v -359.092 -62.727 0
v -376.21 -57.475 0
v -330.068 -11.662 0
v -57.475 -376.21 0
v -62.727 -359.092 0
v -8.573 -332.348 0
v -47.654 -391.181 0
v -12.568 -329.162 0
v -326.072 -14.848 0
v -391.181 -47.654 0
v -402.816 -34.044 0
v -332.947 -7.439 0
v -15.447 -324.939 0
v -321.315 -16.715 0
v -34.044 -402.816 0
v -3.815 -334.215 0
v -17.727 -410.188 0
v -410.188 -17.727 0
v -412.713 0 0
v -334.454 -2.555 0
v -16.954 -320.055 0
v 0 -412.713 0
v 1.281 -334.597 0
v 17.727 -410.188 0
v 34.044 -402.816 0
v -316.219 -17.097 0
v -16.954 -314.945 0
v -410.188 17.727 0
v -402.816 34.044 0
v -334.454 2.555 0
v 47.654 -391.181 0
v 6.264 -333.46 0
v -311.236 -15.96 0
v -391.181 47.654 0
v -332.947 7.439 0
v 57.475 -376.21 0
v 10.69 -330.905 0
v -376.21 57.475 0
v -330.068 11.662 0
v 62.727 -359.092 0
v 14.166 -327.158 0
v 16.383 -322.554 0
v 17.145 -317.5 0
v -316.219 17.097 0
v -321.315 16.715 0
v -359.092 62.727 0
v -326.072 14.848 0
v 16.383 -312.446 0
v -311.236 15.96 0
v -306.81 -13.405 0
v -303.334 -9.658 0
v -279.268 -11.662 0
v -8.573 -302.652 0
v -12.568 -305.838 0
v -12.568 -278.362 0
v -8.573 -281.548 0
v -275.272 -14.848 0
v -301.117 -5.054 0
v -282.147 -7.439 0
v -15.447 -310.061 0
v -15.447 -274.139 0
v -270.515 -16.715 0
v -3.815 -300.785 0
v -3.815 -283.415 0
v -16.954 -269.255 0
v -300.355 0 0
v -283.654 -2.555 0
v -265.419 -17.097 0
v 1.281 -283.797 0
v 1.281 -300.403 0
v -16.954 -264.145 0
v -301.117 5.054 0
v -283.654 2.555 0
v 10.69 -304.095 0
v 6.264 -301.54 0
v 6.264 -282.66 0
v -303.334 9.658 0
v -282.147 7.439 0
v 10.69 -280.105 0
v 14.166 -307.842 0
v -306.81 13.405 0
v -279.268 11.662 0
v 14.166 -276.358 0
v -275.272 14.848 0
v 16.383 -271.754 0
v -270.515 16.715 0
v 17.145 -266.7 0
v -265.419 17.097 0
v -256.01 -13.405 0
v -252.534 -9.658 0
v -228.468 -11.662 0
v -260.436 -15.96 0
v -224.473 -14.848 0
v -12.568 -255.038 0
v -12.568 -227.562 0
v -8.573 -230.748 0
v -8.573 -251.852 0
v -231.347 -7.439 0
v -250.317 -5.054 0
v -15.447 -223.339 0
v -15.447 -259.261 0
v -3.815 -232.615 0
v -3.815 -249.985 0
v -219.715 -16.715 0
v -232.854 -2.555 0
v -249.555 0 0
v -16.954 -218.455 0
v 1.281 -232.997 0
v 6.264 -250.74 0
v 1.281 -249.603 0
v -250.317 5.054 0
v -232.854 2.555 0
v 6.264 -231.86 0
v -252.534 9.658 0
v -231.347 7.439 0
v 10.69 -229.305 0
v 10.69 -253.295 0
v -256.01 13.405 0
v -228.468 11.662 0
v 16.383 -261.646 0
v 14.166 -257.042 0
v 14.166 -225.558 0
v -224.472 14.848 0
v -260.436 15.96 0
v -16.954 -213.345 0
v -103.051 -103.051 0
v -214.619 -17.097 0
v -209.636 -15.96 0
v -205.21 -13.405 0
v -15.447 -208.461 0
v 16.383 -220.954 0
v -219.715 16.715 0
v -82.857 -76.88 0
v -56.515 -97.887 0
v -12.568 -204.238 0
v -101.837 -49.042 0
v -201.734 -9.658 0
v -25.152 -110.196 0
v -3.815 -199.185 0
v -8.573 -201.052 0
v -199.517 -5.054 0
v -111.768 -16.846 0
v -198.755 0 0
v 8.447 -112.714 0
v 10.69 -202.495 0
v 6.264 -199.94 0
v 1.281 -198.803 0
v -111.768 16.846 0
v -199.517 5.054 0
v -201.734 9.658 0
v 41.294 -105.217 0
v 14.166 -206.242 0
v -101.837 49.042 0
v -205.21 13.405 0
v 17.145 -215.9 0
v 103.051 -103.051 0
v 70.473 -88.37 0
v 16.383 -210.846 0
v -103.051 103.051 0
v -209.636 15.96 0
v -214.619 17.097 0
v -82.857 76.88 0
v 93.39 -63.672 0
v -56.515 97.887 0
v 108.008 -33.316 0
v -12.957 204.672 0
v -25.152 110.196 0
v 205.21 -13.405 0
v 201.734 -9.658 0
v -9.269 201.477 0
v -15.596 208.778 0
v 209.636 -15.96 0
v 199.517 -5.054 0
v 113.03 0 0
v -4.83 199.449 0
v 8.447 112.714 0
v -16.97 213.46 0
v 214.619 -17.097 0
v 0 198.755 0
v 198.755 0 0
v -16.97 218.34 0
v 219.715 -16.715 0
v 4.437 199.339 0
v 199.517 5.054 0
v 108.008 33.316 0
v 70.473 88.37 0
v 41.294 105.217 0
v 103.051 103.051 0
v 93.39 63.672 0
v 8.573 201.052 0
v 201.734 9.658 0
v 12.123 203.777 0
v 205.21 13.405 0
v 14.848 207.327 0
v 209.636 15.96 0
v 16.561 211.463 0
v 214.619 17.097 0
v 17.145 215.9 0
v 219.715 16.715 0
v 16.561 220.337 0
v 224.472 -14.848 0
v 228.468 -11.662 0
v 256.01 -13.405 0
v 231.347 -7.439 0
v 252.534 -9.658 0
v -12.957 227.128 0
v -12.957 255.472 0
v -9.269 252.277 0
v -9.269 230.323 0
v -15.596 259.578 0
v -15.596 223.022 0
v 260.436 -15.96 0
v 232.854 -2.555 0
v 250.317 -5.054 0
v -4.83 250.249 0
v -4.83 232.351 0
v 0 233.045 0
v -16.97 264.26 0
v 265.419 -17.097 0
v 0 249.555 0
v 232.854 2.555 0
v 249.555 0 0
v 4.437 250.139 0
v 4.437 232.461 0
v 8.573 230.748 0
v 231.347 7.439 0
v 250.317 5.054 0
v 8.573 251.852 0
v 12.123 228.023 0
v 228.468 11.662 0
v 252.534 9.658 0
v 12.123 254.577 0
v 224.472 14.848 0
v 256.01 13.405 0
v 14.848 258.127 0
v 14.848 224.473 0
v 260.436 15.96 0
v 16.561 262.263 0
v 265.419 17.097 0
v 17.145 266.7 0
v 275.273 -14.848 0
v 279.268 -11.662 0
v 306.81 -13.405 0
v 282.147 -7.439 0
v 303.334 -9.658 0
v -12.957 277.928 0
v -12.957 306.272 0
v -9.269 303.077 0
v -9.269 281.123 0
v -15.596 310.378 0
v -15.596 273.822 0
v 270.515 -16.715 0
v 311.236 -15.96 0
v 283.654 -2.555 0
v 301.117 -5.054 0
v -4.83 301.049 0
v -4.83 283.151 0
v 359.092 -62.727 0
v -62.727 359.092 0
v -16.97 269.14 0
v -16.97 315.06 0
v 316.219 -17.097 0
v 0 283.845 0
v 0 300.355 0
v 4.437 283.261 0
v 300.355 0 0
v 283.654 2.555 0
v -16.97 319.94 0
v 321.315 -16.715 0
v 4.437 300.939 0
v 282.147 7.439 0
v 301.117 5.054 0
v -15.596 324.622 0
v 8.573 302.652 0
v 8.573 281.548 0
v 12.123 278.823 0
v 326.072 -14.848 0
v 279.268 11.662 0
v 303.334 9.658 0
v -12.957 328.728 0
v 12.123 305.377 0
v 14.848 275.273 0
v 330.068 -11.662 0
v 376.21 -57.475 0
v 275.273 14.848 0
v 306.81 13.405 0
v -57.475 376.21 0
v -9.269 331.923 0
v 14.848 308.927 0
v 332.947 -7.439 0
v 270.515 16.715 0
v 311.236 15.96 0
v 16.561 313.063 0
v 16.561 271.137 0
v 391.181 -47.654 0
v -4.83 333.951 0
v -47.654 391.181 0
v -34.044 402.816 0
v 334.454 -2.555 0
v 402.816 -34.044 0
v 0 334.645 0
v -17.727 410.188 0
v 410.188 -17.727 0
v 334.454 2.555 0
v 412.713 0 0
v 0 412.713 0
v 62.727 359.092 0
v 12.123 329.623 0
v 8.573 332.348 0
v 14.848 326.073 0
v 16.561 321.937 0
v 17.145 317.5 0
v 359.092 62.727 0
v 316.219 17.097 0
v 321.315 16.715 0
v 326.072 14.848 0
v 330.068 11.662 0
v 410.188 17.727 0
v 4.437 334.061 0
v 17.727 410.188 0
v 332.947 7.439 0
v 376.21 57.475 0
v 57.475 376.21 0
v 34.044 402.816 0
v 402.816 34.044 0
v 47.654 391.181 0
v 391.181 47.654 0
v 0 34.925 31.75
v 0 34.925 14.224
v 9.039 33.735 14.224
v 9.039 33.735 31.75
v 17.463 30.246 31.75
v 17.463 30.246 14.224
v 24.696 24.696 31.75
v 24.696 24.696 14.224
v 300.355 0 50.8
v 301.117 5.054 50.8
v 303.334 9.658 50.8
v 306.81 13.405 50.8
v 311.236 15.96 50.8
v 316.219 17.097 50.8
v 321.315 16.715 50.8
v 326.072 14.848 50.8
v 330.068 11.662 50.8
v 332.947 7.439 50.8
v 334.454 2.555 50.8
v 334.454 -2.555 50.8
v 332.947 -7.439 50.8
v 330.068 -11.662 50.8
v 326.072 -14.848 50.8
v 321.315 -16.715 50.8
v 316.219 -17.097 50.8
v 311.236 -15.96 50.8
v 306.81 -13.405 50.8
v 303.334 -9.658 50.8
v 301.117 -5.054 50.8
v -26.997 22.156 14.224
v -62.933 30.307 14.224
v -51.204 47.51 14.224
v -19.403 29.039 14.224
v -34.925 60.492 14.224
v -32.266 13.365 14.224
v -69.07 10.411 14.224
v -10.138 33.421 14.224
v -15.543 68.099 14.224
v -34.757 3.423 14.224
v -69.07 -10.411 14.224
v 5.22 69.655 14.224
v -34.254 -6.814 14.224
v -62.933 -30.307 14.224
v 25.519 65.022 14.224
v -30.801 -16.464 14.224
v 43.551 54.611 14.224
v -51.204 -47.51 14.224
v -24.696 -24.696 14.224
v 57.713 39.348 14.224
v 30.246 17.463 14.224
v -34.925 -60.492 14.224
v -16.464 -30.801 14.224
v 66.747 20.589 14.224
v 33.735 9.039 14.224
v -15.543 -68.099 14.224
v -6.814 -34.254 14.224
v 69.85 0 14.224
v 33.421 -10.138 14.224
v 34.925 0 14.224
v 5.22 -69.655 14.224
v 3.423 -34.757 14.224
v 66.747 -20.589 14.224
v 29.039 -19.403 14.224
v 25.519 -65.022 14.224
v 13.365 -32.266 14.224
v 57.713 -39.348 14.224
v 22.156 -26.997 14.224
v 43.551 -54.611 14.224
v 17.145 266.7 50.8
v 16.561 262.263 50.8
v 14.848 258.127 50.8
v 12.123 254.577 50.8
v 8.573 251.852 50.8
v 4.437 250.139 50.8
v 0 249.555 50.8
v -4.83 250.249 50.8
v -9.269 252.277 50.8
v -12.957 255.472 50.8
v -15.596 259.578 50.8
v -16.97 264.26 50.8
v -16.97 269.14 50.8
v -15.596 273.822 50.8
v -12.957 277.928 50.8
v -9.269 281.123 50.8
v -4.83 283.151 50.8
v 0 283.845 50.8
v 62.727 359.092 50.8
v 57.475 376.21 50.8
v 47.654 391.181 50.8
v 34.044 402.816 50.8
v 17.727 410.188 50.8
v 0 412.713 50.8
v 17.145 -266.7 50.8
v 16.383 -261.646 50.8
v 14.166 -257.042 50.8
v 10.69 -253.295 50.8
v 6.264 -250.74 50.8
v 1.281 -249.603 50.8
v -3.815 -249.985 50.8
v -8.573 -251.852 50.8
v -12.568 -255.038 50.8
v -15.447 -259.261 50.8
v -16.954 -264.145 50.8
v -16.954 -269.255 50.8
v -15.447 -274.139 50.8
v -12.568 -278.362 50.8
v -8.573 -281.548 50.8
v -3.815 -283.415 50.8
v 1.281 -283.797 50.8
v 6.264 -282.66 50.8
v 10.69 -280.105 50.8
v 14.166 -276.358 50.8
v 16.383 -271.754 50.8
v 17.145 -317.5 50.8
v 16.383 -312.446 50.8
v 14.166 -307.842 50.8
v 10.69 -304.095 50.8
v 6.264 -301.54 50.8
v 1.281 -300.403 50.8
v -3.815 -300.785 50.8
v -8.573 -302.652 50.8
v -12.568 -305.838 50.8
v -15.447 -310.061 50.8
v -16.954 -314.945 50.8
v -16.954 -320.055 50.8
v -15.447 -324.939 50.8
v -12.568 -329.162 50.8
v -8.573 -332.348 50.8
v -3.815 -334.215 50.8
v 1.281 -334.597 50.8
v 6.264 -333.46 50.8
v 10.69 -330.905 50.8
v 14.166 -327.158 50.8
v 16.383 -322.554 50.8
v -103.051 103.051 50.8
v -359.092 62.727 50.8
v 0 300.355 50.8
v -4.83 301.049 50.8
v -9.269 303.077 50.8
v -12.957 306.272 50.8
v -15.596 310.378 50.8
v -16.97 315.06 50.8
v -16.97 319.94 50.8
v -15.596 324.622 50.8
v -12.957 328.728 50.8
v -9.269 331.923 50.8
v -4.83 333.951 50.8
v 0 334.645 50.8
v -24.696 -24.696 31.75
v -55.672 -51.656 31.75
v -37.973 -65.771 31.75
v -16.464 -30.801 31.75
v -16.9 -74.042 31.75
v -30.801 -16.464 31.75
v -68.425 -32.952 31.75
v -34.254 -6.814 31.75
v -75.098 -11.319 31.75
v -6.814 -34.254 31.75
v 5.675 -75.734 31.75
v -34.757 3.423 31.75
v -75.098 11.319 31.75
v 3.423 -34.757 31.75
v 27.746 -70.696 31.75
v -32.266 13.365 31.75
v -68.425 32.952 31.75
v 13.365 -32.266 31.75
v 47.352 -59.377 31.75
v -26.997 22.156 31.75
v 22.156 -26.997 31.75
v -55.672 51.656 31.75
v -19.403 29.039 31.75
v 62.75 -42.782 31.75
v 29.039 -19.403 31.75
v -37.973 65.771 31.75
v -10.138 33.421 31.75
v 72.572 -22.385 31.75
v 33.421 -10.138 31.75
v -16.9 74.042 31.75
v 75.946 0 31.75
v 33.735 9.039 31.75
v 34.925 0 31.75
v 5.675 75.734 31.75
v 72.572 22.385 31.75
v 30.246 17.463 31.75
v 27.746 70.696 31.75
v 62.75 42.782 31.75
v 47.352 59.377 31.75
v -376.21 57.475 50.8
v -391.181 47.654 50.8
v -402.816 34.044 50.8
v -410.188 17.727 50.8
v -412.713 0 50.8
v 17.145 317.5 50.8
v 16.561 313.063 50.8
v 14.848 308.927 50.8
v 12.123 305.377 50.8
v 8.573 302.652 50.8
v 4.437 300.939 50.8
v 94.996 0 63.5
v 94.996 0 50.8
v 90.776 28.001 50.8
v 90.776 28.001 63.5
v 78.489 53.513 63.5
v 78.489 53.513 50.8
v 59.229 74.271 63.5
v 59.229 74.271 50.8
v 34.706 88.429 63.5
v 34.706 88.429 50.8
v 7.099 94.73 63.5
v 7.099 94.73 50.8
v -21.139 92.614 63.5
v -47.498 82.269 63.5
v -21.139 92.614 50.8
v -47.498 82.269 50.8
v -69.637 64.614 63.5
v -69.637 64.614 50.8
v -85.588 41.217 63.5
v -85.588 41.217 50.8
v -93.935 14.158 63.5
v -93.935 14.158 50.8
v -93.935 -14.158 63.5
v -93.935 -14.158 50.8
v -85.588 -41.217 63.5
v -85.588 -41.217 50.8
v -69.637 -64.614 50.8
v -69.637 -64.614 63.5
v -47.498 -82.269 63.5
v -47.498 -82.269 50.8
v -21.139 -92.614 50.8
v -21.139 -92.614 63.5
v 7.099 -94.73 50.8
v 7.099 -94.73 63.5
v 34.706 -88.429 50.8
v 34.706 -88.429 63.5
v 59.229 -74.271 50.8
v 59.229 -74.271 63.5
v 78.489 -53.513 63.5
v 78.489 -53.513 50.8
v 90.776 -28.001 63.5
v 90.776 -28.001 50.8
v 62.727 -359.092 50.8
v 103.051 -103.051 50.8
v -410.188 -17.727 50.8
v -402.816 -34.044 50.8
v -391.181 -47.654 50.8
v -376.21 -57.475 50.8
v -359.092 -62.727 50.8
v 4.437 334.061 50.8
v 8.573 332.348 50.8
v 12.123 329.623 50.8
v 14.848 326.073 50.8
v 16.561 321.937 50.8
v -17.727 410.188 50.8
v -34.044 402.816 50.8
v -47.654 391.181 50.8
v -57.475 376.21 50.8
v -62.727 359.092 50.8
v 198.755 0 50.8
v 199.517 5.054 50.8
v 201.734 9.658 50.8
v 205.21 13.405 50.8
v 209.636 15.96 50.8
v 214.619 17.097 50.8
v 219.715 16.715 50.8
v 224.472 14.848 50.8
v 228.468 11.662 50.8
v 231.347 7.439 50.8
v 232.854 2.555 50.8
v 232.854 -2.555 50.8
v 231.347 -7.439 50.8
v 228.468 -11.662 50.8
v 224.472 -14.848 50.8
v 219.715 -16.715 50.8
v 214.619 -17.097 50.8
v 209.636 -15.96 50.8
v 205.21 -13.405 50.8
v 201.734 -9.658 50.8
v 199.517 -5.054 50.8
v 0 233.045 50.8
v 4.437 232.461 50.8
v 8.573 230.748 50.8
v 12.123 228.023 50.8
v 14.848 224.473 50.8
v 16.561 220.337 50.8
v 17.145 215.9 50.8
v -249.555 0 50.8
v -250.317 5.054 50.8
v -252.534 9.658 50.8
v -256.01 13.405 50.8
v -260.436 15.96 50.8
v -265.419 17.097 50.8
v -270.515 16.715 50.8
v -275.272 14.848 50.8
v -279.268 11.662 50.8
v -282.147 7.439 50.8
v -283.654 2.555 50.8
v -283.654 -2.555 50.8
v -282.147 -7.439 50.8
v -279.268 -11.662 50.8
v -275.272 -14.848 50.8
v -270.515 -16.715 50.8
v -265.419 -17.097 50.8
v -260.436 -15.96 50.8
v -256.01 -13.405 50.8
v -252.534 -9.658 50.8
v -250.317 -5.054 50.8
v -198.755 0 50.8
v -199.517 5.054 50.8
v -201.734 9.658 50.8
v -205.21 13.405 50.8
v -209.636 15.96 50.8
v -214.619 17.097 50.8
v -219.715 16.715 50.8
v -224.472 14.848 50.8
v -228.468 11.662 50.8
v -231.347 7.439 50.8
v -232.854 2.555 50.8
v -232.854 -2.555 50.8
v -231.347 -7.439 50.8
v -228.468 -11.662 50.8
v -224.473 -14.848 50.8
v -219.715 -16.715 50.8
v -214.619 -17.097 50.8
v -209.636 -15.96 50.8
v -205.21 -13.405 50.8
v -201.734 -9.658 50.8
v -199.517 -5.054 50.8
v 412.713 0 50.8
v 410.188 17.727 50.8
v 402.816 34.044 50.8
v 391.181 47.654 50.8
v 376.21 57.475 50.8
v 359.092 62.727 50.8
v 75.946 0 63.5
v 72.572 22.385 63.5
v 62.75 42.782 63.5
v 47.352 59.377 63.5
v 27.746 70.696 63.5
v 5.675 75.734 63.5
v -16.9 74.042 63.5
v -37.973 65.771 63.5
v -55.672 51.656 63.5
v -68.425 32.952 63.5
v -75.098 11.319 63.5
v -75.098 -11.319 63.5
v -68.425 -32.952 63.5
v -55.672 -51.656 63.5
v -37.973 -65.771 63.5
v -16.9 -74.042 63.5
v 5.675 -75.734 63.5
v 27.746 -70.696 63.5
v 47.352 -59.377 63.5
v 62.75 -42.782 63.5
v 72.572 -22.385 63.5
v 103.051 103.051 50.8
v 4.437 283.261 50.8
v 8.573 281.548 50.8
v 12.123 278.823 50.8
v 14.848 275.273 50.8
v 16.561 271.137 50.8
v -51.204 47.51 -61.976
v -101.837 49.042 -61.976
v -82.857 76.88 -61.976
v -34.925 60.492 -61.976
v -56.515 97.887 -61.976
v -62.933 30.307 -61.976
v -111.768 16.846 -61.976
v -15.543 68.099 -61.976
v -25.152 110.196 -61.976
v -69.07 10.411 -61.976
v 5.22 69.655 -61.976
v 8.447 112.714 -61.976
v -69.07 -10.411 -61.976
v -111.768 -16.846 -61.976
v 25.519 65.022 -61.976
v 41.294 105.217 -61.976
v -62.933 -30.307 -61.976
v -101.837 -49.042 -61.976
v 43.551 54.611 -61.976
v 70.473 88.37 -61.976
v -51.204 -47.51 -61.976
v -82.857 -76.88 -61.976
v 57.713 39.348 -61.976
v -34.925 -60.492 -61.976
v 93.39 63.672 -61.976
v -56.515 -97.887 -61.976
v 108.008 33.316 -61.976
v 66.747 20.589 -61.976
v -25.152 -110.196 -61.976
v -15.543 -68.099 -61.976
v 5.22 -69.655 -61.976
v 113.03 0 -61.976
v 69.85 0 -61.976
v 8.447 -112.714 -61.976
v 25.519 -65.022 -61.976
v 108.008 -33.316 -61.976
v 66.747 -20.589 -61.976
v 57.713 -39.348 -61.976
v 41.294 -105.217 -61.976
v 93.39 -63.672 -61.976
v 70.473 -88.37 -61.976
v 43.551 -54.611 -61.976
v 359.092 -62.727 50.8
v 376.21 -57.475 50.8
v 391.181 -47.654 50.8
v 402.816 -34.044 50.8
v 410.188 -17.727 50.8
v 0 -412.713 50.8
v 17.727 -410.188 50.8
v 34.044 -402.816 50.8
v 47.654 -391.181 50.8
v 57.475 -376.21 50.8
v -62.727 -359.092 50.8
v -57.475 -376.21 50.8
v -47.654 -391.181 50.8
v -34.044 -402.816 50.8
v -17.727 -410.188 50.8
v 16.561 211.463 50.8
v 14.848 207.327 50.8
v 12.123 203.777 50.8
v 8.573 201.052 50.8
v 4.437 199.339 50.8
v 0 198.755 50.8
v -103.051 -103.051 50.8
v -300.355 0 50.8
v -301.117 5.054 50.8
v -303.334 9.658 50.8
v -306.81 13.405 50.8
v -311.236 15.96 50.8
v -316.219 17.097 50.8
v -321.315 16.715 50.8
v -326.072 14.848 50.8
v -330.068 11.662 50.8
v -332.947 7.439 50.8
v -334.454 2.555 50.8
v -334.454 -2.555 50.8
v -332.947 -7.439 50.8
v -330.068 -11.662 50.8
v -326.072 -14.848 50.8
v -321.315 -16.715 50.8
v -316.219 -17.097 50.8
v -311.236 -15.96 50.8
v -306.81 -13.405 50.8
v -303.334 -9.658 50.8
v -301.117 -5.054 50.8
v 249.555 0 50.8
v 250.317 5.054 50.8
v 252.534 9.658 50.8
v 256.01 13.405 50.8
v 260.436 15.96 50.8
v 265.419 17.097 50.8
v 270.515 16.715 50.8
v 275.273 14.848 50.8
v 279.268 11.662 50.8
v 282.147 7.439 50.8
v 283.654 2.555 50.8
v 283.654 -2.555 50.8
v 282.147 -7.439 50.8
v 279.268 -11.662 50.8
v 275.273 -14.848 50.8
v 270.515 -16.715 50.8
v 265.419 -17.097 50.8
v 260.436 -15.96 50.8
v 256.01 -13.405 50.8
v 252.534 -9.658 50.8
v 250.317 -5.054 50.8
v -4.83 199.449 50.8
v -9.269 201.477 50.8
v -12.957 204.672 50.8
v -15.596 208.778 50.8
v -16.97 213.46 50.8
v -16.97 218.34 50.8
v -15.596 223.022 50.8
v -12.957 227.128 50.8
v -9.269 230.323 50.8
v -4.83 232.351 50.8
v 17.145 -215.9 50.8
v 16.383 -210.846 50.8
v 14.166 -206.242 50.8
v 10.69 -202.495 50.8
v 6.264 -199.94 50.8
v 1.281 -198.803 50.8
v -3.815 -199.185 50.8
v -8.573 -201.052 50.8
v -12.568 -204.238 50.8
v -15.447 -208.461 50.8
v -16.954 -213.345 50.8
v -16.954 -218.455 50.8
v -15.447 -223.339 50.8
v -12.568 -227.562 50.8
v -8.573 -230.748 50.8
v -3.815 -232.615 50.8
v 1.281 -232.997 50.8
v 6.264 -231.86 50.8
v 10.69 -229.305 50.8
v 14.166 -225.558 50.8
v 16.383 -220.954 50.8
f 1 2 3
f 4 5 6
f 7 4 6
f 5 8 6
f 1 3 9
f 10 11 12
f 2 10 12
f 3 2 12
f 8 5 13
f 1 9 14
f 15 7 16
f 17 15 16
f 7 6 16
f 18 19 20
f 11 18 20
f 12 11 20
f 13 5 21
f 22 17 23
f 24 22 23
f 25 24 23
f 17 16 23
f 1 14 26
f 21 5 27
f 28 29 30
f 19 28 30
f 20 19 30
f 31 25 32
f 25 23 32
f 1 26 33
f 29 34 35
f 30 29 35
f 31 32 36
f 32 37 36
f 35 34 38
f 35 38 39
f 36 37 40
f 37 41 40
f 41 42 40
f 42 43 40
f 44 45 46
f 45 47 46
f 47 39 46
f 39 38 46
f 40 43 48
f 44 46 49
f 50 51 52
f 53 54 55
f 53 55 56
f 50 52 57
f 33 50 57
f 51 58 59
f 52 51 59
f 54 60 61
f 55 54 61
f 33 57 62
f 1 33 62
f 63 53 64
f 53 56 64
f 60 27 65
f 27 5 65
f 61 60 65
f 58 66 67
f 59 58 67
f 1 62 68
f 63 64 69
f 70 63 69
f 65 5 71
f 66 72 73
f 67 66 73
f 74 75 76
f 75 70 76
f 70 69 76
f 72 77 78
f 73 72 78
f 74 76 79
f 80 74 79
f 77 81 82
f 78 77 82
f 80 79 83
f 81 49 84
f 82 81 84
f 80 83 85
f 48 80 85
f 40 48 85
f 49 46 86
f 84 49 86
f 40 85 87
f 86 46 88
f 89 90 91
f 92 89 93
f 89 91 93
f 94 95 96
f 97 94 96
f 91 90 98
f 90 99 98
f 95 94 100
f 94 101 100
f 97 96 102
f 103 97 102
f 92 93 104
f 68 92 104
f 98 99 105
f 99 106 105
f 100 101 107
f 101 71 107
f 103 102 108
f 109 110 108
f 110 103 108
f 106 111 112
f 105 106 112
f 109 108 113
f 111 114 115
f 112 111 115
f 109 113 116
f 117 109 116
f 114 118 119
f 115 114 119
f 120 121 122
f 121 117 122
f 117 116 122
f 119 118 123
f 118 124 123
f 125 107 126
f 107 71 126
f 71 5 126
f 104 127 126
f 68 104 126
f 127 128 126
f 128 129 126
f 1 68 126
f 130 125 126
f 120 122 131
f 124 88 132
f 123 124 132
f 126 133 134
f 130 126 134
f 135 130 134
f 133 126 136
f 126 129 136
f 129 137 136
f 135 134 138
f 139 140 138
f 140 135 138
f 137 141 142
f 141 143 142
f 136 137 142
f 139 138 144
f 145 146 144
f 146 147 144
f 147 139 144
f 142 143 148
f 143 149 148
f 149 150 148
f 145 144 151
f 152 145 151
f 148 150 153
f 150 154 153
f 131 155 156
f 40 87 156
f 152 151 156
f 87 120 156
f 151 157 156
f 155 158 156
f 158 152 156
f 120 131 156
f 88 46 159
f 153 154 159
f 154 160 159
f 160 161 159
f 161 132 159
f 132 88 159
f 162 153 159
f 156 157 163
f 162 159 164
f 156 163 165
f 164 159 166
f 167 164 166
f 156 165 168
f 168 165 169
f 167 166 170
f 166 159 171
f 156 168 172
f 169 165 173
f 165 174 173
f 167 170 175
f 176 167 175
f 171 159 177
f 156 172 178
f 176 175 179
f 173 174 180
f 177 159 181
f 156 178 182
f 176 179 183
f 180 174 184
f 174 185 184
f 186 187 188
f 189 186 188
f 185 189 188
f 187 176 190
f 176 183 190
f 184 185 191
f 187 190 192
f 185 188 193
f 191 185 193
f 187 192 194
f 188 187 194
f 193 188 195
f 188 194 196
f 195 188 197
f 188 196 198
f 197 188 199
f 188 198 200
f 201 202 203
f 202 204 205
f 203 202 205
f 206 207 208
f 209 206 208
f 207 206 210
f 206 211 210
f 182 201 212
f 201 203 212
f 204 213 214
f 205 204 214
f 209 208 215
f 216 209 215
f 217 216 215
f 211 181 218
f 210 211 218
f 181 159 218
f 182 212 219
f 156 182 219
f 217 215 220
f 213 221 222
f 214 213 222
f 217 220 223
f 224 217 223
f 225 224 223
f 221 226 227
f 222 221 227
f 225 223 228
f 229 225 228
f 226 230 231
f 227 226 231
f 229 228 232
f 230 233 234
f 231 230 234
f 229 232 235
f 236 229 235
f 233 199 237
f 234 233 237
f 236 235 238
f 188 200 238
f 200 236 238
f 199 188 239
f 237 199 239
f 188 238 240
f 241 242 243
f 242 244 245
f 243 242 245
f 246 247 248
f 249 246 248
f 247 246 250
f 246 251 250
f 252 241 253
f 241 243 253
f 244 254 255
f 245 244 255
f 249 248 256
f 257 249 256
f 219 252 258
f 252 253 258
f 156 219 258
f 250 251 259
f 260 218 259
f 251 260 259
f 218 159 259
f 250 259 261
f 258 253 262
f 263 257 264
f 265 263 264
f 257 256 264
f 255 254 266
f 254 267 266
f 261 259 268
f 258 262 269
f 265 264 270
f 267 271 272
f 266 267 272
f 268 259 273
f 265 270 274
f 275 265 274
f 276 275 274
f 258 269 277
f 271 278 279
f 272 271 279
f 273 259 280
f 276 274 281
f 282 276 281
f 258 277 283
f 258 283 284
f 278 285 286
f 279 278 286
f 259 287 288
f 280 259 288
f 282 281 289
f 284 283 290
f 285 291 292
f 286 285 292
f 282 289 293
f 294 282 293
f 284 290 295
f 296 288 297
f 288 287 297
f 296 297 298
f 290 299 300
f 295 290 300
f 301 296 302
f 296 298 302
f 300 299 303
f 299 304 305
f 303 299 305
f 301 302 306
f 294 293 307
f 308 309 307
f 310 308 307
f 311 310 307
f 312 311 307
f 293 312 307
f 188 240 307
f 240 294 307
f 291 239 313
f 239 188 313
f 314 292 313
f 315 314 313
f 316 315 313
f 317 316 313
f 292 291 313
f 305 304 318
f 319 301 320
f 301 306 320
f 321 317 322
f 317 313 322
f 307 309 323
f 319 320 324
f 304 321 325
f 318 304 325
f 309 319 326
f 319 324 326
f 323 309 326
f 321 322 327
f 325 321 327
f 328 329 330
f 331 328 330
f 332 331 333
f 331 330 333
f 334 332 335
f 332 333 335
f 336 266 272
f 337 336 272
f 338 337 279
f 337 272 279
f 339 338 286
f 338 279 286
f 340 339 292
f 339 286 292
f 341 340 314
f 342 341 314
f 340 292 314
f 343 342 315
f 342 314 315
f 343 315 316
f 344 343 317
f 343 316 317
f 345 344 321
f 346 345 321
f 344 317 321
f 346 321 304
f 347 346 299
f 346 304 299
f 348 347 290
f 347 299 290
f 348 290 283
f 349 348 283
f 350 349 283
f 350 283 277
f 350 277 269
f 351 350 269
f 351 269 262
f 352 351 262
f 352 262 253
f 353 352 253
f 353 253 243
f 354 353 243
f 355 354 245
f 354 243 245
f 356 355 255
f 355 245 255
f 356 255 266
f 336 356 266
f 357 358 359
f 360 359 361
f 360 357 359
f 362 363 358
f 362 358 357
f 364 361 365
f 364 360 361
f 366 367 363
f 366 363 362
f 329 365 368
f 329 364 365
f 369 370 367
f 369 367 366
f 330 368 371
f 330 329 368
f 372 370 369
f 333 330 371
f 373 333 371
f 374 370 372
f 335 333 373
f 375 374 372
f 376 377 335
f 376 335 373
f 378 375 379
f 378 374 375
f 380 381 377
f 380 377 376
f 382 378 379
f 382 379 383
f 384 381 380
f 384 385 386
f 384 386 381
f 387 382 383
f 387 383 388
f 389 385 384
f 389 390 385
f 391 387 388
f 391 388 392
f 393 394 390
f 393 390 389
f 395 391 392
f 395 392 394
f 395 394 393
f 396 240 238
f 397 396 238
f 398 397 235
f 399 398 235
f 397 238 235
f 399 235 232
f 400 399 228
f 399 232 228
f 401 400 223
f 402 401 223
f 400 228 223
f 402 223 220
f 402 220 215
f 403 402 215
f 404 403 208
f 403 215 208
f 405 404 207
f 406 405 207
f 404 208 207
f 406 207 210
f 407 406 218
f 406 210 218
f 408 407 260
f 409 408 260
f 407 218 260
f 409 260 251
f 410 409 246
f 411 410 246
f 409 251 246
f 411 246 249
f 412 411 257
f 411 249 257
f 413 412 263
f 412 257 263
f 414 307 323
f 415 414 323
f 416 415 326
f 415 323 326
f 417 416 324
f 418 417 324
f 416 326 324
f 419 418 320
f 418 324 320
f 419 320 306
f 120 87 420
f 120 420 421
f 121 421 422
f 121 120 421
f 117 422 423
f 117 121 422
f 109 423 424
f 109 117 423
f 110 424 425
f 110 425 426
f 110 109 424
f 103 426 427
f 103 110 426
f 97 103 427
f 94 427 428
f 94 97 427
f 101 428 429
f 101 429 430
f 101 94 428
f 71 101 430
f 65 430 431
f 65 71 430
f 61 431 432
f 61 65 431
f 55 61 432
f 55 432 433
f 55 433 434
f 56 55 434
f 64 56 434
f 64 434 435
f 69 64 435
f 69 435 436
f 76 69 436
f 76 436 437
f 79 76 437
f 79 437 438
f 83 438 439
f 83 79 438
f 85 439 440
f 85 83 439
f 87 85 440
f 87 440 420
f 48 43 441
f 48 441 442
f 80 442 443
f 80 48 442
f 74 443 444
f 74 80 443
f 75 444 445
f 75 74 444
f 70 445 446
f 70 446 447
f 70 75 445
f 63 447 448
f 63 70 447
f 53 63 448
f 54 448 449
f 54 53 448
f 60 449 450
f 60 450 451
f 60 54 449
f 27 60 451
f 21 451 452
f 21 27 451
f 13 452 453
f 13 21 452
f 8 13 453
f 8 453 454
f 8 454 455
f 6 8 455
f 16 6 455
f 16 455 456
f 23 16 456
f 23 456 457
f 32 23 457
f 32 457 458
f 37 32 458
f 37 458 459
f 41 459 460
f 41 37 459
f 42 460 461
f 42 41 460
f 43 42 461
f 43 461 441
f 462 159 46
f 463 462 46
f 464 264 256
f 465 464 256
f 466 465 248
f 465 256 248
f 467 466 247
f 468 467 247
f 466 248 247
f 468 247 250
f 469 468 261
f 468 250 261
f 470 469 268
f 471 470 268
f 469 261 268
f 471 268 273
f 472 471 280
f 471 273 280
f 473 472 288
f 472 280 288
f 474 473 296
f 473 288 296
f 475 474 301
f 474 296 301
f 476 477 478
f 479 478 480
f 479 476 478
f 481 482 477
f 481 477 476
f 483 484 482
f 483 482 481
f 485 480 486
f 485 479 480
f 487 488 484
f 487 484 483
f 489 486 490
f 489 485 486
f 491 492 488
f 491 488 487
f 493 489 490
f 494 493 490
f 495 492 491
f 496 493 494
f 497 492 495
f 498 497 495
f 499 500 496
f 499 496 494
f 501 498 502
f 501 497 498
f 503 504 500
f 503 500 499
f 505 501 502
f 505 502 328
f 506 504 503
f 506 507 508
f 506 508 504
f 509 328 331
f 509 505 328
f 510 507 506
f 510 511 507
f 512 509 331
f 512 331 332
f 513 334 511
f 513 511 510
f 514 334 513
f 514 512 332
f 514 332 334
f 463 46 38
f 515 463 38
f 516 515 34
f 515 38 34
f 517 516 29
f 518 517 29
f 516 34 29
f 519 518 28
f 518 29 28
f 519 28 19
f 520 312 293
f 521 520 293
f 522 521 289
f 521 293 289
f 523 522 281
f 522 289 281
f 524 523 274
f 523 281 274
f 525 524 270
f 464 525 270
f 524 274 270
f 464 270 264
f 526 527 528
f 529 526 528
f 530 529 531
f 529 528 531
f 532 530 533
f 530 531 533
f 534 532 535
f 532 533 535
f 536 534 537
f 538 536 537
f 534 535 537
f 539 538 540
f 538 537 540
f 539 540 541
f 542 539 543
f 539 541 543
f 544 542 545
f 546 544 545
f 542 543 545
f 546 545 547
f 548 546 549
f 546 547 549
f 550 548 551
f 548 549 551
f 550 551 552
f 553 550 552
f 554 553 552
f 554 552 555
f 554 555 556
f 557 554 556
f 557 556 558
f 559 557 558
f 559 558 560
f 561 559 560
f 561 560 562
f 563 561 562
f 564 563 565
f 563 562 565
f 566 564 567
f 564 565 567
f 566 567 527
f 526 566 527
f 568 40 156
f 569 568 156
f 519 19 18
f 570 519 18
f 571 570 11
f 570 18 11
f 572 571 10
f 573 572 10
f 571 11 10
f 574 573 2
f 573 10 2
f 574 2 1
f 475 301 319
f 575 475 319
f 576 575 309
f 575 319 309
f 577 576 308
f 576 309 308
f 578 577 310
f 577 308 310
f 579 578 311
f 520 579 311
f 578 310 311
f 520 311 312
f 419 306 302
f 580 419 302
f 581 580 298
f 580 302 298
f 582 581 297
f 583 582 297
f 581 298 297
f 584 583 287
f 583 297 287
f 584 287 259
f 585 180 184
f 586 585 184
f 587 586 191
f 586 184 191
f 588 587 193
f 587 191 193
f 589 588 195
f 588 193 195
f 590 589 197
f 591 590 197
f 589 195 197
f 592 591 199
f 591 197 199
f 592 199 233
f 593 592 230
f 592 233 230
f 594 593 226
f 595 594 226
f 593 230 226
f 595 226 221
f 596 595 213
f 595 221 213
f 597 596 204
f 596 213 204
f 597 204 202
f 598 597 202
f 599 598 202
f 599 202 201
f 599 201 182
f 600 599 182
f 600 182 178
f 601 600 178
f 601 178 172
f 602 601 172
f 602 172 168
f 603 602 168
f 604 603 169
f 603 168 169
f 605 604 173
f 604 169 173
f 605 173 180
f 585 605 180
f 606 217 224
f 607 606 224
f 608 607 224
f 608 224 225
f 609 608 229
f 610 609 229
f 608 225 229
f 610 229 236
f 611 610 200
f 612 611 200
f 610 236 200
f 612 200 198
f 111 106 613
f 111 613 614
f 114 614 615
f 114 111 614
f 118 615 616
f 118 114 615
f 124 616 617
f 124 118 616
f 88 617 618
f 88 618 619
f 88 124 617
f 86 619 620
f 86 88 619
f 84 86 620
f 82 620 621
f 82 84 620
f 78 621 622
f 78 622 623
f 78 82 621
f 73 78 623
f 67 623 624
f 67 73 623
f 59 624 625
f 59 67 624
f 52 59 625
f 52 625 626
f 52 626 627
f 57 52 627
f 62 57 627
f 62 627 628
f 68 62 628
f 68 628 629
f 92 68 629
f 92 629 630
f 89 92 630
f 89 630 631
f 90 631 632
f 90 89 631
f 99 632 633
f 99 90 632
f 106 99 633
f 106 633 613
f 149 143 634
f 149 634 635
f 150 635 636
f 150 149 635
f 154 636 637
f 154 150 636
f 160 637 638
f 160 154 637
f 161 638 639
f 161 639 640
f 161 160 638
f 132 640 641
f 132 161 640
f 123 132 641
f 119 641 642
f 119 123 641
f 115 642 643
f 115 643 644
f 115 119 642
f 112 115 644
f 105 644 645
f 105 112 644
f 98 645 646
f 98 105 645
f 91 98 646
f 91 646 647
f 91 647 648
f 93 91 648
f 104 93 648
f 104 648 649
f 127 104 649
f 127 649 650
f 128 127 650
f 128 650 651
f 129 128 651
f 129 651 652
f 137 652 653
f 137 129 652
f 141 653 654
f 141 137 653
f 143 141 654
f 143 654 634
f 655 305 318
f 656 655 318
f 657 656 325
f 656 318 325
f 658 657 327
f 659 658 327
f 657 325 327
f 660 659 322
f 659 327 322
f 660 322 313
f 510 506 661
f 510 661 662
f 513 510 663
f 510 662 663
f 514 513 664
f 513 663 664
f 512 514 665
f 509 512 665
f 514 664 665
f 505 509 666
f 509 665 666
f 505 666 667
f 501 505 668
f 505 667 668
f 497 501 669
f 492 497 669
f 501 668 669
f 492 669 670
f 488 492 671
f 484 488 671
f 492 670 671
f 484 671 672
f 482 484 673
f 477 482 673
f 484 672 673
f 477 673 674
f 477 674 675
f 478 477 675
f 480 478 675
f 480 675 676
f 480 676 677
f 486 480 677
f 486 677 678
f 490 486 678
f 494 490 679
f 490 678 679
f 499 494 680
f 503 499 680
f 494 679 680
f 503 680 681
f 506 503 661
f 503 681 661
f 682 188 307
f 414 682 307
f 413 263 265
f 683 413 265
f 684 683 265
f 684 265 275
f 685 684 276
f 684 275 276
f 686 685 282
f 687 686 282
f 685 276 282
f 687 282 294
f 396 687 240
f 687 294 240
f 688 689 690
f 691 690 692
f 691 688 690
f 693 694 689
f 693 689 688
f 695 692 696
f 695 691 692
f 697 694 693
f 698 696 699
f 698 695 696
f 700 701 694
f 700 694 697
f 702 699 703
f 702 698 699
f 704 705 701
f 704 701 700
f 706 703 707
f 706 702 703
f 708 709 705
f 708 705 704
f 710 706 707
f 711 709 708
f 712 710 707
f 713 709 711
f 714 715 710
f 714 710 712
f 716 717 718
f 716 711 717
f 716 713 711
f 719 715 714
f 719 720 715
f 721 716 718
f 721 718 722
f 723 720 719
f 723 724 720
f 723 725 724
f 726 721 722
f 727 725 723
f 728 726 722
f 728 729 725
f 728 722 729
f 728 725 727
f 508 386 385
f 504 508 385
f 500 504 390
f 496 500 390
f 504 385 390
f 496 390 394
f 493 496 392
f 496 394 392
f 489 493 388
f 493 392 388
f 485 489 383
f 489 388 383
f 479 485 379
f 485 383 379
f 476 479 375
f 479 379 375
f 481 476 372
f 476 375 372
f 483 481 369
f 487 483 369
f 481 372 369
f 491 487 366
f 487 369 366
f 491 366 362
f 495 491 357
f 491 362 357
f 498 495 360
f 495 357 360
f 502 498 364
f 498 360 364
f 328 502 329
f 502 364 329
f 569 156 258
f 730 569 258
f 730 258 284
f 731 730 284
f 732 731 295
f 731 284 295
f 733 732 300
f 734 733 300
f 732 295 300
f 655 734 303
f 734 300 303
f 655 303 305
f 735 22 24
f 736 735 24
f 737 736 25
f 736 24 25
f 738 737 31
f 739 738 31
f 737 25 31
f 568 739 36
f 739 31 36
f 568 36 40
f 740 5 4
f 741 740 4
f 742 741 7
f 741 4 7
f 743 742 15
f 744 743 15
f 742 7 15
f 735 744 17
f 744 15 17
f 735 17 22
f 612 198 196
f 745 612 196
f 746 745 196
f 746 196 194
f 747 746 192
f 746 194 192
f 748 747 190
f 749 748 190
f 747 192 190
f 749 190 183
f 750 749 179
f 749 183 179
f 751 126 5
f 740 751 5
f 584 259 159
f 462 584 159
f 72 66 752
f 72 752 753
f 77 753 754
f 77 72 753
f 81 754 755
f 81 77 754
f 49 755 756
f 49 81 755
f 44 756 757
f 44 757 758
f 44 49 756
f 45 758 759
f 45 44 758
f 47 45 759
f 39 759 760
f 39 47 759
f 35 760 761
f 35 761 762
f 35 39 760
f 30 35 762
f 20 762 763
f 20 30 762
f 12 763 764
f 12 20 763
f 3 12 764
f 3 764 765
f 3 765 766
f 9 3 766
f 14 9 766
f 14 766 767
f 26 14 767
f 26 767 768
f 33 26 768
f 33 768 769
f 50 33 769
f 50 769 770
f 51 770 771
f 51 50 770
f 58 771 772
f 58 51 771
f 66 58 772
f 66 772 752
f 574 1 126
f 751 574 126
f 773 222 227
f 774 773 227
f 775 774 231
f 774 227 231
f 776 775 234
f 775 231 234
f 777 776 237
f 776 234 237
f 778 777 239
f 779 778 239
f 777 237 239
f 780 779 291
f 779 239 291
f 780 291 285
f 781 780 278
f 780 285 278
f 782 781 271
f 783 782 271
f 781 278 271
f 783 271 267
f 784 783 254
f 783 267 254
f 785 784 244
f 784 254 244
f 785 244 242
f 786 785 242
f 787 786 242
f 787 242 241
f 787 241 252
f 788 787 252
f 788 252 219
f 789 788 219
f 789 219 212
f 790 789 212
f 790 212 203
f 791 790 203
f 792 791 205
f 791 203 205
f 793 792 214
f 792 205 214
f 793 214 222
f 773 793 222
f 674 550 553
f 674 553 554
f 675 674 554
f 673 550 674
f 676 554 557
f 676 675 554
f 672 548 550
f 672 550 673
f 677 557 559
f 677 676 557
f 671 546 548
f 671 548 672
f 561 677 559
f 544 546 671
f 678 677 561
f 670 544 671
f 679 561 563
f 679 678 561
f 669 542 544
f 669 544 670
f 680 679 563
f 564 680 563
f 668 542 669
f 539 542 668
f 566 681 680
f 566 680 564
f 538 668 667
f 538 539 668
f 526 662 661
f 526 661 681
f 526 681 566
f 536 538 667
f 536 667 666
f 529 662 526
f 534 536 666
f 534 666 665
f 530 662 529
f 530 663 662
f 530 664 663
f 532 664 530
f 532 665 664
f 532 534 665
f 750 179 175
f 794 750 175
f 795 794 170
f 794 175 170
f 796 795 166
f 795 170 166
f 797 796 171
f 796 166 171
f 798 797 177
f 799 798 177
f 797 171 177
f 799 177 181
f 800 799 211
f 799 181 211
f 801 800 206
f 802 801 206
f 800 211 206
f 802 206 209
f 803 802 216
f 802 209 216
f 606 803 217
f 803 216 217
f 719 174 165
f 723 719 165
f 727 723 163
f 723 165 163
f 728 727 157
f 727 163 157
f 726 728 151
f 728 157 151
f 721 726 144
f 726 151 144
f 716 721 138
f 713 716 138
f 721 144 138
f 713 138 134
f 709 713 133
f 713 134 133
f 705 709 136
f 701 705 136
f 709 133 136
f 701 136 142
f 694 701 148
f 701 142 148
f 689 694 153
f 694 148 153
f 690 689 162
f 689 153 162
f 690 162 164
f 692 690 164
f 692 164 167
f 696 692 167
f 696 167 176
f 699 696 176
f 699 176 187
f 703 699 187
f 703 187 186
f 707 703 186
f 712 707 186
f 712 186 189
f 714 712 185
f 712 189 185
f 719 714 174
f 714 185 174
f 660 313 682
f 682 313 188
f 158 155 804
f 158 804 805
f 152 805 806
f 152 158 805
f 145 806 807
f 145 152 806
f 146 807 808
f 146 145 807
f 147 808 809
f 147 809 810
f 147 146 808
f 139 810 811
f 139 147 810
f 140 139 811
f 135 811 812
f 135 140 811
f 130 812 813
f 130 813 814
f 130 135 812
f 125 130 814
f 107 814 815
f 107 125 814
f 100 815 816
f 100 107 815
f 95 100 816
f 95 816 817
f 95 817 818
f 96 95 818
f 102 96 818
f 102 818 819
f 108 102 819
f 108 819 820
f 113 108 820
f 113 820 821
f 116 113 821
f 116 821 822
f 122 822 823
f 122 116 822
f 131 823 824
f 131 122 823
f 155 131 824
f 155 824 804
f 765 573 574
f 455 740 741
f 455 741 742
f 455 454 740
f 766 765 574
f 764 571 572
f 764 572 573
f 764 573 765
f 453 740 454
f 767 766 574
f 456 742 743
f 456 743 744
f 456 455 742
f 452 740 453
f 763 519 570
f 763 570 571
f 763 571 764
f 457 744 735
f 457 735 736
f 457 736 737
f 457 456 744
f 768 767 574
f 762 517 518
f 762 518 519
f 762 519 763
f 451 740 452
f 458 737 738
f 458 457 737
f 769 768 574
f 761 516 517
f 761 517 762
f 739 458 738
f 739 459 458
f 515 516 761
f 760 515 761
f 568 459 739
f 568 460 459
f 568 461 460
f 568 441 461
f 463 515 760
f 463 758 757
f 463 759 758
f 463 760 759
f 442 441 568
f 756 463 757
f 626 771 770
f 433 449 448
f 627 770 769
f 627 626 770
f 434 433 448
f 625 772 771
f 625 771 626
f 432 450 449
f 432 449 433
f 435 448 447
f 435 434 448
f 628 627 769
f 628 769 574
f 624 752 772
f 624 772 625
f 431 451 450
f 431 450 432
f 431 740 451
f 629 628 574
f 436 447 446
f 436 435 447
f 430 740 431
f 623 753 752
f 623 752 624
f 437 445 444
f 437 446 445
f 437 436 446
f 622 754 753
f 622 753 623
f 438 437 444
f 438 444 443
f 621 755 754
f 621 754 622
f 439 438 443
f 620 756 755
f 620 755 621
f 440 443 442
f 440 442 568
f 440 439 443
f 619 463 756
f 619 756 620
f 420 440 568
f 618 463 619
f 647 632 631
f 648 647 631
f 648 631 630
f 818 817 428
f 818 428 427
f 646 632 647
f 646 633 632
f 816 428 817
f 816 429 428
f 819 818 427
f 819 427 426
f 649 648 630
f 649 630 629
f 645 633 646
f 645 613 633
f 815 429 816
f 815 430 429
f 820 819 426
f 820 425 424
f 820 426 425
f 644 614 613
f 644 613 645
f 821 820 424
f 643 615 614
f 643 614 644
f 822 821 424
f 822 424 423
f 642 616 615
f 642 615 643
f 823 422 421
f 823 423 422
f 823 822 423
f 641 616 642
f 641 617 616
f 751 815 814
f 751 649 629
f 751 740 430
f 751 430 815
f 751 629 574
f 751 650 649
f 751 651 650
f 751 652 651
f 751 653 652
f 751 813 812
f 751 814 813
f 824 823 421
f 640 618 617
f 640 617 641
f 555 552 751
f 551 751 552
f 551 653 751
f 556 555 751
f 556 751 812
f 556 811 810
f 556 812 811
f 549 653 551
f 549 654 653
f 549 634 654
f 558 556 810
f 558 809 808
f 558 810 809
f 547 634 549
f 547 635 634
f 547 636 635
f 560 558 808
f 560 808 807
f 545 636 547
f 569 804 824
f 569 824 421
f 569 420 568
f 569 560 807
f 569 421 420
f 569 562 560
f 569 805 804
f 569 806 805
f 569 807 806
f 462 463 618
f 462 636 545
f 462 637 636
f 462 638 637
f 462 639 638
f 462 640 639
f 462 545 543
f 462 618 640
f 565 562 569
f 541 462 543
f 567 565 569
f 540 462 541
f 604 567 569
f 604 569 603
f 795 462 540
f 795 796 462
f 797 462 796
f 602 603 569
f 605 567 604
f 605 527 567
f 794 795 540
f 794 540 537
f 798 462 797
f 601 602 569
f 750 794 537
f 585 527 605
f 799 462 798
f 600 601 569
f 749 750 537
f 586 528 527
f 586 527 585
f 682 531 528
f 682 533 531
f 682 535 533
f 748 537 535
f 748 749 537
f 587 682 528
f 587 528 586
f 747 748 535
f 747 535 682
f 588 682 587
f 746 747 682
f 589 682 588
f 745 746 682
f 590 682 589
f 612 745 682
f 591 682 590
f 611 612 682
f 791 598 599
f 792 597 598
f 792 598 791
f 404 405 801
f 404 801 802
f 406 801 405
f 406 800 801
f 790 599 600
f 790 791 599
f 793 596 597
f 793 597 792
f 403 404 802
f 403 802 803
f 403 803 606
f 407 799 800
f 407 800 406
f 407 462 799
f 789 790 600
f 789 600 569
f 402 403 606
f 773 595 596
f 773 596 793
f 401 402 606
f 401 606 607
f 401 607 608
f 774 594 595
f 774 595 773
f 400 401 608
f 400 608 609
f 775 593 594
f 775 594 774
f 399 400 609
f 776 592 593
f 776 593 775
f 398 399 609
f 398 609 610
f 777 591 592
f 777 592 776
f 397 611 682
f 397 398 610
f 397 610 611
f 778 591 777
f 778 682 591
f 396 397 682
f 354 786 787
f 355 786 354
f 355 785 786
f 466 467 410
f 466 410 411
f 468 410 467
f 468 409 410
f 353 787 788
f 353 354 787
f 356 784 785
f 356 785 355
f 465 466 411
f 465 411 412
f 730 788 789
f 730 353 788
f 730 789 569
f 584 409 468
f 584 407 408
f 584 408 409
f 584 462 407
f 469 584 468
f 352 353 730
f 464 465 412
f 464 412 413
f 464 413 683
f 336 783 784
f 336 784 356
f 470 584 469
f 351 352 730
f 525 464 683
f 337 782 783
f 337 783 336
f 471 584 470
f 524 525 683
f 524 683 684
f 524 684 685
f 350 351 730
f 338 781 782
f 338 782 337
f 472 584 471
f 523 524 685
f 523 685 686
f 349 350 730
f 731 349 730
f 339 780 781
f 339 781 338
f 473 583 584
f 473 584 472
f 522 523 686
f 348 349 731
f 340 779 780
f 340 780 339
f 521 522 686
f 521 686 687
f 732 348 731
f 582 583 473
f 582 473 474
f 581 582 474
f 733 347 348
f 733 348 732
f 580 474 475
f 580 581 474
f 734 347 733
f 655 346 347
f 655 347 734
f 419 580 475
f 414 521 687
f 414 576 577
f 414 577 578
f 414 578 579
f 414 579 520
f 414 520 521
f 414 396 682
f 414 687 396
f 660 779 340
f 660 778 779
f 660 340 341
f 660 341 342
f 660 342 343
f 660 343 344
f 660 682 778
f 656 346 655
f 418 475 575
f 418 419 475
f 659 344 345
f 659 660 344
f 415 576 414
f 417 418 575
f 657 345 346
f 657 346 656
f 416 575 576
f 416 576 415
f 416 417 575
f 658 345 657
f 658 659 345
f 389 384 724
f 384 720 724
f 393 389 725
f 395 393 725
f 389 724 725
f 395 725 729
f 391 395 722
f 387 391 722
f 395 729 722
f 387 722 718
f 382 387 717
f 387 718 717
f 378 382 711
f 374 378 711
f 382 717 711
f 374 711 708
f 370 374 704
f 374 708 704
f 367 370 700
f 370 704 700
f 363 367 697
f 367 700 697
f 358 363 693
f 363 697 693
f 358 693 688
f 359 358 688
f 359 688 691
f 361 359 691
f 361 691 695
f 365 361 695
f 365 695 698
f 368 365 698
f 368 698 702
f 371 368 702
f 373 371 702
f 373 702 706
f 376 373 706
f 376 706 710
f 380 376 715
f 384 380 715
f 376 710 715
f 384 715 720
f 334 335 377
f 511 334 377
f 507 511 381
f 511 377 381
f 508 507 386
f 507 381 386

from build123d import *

# Parameters (mm, degrees)
F0_R     = 17.145
F1_DEPTH = 50.8
F2_R     = 94.996
F2_R_2   = 75.946
F3_DEPTH = 12.7
F4_R     = 75.946
F5_DEPTH = 31.75
F6_R     = 113.03
F6_R_2   = 69.85
F7_DEPTH = 61.976
F8_R     = 69.85
F9_DEPTH = 76.2


with BuildPart() as f1:
    # F0 (on Top) → F1 (new body)
    with BuildSketch(Plane.XY):
        with BuildLine():
            ThreePointArc((34.925, 0), (-24.695704, -24.695704), (0, 34.925))
            Line((0, 34.925), (0, 198.755))
            ThreePointArc((0, 198.755), (-17.145, 215.9), (0, 233.045))
            Line((0, 233.045), (0, 249.555))
            ThreePointArc((0, 249.555), (-17.145, 266.7), (0, 283.845))
            Line((0, 283.845), (0, 300.355))
            ThreePointArc((0, 300.355), (-17.145, 317.5), (0, 334.645))
            Line((0, 334.645), (0, 412.712916))
            ThreePointArc((0, 412.712916), (-41.261016, 397.480696), (-62.726854, 359.091769))
            Line((-62.726854, 359.091769), (-103.050756, 103.050756))
            Line((-103.050756, 103.050756), (-359.091769, 62.726854))
            ThreePointArc((-359.091769, 62.726854), (-397.480696, 41.261016), (-412.712916, 0))
            ThreePointArc((-412.712916, 0), (-397.480696, -41.261016), (-359.091769, -62.726854))
            Line((-359.091769, -62.726854), (-103.050756, -103.050756))
            Line((-103.050756, -103.050756), (-62.726854, -359.091769))
            ThreePointArc((-62.726854, -359.091769), (-41.261016, -397.480696), (0, -412.712916))
            ThreePointArc((0, -412.712916), (41.261016, -397.480696), (62.726854, -359.091769))
            Line((62.726854, -359.091769), (103.050756, -103.050756))
            Line((103.050756, -103.050756), (359.091769, -62.726854))
            ThreePointArc((359.091769, -62.726854), (397.480696, -41.261016), (412.712916, 0))
            Line((412.712916, 0), (334.645, 0))
            ThreePointArc((334.645, 0), (317.5, -17.145), (300.355, 0))
            Line((300.355, 0), (283.845, 0))
            ThreePointArc((283.845, 0), (266.7, -17.145), (249.555, 0))
            Line((249.555, 0), (233.045, 0))
            ThreePointArc((233.045, 0), (215.9, -17.145), (198.755, 0))
            Line((198.755, 0), (34.925, 0))
        make_face()
        with Locations((0, -317.5)):
            Circle(F0_R, mode=Mode.SUBTRACT)
        with Locations((0, -266.7)):
            Circle(F0_R, mode=Mode.SUBTRACT)
        with Locations((0, -215.9)):
            Circle(F0_R, mode=Mode.SUBTRACT)
        with Locations((-317.5, 0)):
            Circle(F0_R, mode=Mode.SUBTRACT)
        with Locations((-266.7, 0)):
            Circle(F0_R, mode=Mode.SUBTRACT)
        with Locations((-215.9, 0)):
            Circle(F0_R, mode=Mode.SUBTRACT)
        with BuildLine():
            Line((0, 198.755), (0, 34.925))
            ThreePointArc((0, 34.925), (13.365219, 32.266493), (24.695704, 24.695704))
            Line((24.695704, 24.695704), (103.050756, 103.050756))
            Line((103.050756, 103.050756), (62.726854, 359.091769))
            ThreePointArc((62.726854, 359.091769), (41.261016, 397.480696), (0, 412.712916))
            Line((0, 412.712916), (0, 334.645))
            ThreePointArc((0, 334.645), (12.123346, 329.623346), (17.145, 317.5))
            ThreePointArc((17.145, 317.5), (12.123346, 305.376654), (0, 300.355))
            Line((0, 300.355), (0, 283.845))
            ThreePointArc((0, 283.845), (12.123346, 278.823346), (17.145, 266.7))
            ThreePointArc((17.145, 266.7), (12.123346, 254.576654), (0, 249.555))
            Line((0, 249.555), (0, 233.045))
            ThreePointArc((0, 233.045), (12.123346, 228.023346), (17.145, 215.9))
            ThreePointArc((17.145, 215.9), (12.123346, 203.776654), (0, 198.755))
        make_face()
        with BuildLine():
            Line((103.050756, 103.050756), (24.695704, 24.695704))
            ThreePointArc((24.695704, 24.695704), (32.266493, 13.365219), (34.925, 0))
            Line((34.925, 0), (198.755, 0))
            ThreePointArc((198.755, 0), (215.9, 17.145), (233.045, 0))
            Line((233.045, 0), (249.555, 0))
            ThreePointArc((249.555, 0), (266.7, 17.145), (283.845, 0))
            Line((283.845, 0), (300.355, 0))
            ThreePointArc((300.355, 0), (317.5, 17.145), (334.645, 0))
            Line((334.645, 0), (412.712916, 0))
            ThreePointArc((412.712916, 0), (397.480696, 41.261016), (359.091769, 62.726854))
            Line((359.091769, 62.726854), (103.050756, 103.050756))
        make_face()
    extrude(amount=F1_DEPTH)

    # F2 (on face) → F3 (join)
    with BuildSketch(Plane.XY.offset(50.8)):
        Circle(F2_R)
        Circle(F2_R_2, mode=Mode.SUBTRACT)
    extrude(amount=F3_DEPTH)

    # F4 (on face) → F5 (cut)
    with BuildSketch(Plane.XY.offset(63.5)):
        Circle(F4_R)
    extrude(amount=-F5_DEPTH, mode=Mode.SUBTRACT)

    # F6 (on face) → F7 (join)
    with BuildSketch(Plane(origin=(0, 0, 0), x_dir=(1, 0, 0), z_dir=(0, 0, -1))):
        Circle(F6_R)
        Circle(F6_R_2, mode=Mode.SUBTRACT)
    extrude(amount=F7_DEPTH)

    # F8 (on face) → F9 (cut)
    with BuildSketch(Plane(origin=(0, 0, -61.976), x_dir=(1, 0, 0), z_dir=(0, 0, -1))):
        Circle(F8_R)
    extrude(amount=-F9_DEPTH, mode=Mode.SUBTRACT)


solid = f1.part
